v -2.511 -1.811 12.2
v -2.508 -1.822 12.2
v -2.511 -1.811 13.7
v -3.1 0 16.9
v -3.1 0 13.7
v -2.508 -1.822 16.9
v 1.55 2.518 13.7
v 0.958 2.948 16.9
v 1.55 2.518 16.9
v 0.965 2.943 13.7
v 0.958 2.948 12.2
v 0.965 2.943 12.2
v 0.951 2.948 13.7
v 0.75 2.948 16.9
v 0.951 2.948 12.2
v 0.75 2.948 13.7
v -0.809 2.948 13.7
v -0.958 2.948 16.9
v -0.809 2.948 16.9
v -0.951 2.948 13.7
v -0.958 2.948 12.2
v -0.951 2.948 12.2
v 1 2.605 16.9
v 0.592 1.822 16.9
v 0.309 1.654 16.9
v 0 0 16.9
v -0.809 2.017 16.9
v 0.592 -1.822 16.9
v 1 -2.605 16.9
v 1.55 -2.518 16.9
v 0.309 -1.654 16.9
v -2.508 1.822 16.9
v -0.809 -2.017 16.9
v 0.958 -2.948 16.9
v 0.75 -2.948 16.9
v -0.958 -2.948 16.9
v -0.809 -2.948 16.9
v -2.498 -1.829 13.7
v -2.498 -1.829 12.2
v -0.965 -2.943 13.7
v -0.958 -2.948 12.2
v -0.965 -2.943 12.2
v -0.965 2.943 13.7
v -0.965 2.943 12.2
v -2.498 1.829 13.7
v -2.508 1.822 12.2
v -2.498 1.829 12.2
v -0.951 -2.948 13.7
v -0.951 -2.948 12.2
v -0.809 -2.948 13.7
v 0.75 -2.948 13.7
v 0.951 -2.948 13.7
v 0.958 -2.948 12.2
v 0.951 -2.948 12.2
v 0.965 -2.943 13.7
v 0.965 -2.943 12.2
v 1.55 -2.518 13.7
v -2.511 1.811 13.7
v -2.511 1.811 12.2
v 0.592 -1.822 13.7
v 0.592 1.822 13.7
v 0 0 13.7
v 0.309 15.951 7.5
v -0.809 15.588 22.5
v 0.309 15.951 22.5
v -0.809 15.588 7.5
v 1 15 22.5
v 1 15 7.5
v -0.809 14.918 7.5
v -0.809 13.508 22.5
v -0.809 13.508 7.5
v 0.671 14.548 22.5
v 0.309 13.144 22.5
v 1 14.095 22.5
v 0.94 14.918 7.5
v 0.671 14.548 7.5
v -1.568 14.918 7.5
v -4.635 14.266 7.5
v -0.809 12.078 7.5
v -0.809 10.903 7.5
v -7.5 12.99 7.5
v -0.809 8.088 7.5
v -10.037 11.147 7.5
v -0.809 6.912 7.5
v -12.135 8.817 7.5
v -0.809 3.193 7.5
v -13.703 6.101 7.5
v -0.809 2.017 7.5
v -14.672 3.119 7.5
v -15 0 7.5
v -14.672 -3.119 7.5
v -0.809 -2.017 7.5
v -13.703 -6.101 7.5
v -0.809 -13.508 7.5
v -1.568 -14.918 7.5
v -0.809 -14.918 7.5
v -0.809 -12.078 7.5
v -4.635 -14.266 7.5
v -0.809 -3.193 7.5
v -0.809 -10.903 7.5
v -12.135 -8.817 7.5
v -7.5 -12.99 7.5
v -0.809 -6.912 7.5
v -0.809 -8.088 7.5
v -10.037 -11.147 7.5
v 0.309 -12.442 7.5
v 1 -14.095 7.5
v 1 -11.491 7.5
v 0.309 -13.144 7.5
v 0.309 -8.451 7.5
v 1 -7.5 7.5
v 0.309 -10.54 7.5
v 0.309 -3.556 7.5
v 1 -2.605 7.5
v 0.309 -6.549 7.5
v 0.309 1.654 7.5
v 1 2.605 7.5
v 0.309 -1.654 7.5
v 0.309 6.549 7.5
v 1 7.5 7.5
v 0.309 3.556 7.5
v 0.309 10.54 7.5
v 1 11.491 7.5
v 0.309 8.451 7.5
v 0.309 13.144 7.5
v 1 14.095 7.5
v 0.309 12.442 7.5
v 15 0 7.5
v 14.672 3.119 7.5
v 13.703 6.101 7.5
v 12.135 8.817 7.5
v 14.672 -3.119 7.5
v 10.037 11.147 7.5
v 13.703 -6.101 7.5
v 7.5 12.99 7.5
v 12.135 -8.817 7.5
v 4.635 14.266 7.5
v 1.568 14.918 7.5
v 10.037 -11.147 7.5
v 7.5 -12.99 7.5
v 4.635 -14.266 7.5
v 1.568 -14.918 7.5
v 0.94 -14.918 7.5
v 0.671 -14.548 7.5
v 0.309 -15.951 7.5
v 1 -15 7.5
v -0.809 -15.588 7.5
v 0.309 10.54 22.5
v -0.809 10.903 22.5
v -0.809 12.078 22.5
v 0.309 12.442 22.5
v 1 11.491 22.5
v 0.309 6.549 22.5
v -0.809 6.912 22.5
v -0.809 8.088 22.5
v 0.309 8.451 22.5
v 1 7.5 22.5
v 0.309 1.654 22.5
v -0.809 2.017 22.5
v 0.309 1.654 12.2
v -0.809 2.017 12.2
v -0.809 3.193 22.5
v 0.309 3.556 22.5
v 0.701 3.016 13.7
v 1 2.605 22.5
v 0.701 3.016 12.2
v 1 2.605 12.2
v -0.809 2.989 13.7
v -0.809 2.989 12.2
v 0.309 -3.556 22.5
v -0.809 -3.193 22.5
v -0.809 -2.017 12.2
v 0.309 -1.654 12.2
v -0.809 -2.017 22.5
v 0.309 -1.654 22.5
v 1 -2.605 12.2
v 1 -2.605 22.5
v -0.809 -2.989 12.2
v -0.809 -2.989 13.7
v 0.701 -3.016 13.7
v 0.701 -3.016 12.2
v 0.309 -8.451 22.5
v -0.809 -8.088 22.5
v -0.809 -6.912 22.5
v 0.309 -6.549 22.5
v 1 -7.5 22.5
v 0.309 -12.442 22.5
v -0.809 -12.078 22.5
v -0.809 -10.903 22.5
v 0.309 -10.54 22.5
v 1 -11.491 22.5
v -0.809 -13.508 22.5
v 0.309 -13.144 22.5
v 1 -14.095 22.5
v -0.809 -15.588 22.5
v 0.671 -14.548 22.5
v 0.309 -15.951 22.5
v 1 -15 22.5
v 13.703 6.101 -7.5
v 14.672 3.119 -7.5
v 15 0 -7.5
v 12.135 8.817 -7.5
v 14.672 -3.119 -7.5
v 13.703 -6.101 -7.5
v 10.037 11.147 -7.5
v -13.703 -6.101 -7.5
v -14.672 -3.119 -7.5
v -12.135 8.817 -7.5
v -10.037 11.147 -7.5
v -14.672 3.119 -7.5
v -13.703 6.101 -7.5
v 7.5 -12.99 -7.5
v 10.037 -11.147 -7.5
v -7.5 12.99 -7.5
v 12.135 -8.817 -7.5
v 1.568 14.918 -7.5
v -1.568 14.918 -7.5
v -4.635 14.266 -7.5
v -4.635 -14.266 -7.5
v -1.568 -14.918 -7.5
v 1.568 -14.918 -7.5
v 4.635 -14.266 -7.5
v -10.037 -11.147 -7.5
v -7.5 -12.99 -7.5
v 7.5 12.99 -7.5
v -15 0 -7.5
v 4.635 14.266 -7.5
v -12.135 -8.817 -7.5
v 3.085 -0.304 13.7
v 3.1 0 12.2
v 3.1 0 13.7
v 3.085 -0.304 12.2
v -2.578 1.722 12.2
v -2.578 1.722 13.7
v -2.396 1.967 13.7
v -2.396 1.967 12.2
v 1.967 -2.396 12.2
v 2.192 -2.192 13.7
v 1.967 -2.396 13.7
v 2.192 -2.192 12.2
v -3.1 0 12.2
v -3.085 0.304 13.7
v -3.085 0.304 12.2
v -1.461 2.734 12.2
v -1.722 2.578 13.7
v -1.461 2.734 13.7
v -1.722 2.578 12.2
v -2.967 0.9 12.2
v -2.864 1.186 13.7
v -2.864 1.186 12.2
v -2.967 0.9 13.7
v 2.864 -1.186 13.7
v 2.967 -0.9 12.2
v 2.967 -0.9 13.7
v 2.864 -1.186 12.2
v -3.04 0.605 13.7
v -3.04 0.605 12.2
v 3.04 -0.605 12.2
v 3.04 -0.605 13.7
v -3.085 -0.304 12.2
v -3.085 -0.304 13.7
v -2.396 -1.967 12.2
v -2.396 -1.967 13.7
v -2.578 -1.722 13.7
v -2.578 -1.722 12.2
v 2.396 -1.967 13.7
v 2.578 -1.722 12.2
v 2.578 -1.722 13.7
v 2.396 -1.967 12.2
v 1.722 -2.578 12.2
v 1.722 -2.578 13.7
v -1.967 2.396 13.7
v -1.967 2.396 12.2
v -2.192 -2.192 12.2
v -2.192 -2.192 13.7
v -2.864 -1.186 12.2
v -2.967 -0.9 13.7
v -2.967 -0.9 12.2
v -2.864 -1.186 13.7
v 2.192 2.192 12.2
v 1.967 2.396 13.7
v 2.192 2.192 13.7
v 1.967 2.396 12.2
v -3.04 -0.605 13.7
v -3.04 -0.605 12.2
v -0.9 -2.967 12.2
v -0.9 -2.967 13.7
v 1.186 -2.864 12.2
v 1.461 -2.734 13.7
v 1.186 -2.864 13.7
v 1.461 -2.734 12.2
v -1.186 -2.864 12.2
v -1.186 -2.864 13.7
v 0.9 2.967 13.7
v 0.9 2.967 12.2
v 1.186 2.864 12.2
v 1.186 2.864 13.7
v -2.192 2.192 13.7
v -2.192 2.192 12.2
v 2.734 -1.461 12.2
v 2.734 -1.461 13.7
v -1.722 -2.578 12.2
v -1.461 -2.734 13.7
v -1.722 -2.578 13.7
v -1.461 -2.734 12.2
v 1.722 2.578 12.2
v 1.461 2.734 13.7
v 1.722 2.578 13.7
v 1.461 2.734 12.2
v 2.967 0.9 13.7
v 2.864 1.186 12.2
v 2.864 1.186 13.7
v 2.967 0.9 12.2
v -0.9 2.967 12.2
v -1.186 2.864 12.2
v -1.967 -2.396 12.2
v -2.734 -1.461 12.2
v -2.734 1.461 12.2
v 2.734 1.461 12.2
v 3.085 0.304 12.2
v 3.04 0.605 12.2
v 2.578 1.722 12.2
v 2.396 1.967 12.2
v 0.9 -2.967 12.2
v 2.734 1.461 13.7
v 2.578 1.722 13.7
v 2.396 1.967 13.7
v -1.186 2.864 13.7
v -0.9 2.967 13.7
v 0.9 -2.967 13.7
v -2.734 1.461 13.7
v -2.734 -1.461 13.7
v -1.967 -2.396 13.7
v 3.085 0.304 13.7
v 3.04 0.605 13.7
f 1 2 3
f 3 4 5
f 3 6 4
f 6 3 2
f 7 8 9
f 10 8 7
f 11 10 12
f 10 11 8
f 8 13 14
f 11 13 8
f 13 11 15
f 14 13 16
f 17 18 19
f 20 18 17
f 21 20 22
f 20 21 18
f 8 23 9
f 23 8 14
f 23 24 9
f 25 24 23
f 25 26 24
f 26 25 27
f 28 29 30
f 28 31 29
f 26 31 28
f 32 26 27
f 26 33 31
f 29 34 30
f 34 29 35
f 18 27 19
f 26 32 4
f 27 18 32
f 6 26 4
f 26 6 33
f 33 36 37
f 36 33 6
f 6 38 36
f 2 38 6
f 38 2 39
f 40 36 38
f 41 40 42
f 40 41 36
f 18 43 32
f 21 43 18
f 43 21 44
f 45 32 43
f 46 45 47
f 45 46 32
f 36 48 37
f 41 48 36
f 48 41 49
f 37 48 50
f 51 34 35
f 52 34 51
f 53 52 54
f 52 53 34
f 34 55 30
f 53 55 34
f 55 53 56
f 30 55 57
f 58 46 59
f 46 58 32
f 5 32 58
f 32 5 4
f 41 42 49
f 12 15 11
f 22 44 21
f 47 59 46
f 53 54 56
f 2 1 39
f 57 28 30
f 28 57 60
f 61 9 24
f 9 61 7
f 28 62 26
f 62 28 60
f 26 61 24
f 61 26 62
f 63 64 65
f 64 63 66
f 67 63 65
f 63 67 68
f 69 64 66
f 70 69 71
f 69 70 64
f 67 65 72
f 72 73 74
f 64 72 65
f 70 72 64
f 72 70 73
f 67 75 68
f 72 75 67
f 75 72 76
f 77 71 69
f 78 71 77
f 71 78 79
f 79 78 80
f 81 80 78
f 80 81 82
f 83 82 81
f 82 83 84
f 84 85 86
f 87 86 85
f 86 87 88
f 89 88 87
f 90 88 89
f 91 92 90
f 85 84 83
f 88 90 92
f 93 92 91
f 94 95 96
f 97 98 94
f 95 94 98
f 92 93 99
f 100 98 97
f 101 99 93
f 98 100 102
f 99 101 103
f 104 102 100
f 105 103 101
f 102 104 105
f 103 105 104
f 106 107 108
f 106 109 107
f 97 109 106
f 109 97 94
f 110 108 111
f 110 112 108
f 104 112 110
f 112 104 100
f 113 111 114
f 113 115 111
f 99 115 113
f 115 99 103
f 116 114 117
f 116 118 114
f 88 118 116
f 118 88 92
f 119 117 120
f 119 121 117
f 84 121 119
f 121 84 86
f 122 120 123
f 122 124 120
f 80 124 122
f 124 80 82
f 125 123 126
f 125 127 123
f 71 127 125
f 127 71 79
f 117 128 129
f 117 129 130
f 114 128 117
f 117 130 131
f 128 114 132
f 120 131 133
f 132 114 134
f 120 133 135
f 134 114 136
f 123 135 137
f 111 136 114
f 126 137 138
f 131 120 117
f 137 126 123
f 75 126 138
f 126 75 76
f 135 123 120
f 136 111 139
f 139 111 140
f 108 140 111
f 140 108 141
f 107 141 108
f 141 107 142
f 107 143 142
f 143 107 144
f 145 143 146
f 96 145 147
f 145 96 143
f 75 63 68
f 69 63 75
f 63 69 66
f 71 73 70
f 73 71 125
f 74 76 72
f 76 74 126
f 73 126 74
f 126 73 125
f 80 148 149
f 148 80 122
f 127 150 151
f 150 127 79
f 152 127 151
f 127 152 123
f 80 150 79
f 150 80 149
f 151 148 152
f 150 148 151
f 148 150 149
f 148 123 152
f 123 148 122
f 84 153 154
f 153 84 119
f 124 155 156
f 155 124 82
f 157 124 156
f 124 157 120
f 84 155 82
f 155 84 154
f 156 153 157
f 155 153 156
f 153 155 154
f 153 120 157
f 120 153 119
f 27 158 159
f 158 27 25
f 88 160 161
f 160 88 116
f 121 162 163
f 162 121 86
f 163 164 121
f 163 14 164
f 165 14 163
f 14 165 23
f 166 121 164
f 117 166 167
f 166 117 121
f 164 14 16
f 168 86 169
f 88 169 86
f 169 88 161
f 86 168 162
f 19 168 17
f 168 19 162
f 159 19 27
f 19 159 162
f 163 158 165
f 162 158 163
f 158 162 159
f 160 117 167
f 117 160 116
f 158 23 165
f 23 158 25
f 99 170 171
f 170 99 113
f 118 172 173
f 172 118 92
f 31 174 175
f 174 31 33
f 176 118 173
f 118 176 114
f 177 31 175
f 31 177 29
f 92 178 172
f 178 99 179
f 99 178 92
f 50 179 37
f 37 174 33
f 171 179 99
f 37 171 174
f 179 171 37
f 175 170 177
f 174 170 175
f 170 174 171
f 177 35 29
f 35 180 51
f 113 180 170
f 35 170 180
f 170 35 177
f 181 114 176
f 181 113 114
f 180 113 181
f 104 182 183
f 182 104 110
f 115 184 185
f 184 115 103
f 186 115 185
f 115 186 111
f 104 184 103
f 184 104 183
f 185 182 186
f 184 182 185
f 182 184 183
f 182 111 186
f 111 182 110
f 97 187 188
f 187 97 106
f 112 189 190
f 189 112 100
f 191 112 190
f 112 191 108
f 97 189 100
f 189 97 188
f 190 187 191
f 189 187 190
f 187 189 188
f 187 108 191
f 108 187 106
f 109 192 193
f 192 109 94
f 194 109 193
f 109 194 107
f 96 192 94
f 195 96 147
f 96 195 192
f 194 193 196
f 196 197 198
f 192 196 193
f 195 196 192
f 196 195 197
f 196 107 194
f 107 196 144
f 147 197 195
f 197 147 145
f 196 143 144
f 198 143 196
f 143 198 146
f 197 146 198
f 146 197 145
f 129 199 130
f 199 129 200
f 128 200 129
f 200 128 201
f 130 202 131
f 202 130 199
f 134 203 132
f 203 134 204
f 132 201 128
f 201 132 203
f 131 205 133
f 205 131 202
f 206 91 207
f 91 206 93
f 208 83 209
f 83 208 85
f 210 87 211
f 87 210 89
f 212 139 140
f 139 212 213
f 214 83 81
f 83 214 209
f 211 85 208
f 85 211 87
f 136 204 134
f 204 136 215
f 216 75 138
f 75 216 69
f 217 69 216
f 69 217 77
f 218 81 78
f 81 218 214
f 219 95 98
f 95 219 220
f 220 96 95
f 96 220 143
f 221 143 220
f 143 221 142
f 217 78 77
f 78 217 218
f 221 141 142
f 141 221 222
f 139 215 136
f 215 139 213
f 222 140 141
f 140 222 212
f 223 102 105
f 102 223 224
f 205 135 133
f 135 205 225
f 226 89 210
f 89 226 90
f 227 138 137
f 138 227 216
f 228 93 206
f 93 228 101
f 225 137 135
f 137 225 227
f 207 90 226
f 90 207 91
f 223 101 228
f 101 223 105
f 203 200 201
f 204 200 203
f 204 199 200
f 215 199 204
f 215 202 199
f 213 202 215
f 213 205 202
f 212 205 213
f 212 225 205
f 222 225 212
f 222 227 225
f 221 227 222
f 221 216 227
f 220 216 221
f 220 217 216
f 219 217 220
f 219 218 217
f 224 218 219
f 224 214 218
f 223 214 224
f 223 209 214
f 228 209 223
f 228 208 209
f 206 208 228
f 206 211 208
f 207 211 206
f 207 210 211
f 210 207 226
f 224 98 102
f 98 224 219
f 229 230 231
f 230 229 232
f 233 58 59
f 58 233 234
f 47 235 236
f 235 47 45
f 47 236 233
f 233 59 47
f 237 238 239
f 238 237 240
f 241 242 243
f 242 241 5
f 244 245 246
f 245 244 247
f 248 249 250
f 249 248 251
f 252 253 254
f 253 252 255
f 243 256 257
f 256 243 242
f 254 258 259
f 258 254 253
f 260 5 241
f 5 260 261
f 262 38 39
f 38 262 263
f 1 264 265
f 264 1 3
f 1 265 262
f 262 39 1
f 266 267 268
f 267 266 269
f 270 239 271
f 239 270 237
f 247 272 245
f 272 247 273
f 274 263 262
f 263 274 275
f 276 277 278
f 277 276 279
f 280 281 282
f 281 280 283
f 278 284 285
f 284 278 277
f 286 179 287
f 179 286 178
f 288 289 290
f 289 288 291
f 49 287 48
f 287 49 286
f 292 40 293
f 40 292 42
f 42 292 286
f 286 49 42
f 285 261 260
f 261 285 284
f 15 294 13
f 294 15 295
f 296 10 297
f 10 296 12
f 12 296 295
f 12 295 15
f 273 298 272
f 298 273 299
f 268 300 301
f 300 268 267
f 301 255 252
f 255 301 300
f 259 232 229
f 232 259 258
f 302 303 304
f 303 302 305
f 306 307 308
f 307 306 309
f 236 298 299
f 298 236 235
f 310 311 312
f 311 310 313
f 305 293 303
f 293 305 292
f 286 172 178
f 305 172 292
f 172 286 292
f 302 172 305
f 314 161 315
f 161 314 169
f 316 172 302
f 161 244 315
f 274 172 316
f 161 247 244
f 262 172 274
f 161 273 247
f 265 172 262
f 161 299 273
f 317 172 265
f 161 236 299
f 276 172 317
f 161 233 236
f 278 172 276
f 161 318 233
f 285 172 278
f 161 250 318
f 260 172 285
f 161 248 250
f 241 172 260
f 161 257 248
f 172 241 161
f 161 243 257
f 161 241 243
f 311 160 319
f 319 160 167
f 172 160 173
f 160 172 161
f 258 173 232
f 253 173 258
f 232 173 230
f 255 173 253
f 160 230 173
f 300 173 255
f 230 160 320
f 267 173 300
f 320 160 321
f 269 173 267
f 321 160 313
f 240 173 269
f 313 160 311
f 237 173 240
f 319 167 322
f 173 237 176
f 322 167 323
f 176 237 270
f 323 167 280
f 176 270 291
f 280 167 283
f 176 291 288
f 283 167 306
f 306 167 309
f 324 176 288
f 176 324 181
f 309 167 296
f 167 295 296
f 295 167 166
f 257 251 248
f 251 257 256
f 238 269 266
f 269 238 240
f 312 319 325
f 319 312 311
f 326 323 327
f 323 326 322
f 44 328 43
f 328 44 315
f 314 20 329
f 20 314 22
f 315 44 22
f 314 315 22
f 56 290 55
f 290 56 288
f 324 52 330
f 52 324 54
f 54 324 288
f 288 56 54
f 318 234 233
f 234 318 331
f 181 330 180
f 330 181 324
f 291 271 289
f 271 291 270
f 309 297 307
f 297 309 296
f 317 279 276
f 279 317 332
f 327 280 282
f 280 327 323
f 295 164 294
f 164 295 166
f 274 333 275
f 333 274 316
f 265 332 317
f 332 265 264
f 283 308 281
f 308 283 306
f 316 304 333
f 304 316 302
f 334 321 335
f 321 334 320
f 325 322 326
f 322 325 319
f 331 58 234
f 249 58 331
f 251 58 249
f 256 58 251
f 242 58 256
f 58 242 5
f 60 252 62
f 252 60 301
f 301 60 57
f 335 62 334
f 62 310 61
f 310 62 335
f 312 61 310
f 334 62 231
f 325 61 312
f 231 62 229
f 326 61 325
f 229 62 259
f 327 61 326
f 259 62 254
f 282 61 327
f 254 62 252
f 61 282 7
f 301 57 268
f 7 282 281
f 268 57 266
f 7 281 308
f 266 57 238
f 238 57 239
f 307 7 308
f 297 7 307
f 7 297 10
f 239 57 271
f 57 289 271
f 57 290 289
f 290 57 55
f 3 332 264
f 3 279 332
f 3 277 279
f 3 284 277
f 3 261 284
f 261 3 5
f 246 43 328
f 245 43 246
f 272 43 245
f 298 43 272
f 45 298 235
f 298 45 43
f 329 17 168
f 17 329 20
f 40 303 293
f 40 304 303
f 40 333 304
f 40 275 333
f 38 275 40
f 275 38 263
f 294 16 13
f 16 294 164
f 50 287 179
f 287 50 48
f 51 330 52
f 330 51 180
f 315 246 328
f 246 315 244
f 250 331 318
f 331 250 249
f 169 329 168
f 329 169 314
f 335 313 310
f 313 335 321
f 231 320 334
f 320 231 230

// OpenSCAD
// Dimensions in mm
knob_diameter = 30;
knob_height = 15;
d_bore_diameter = 6.2;
d_bore_flat_distance = 4.7;
groove_diameter = 2;
groove_depth = 0;

// Z-axis offset to mirror the knob on the XY plane
z_offset = -knob_height / 2;

// Build the knob
translate([0, 0, z_offset])
    cylinder(h=knob_height, d=knob_diameter);

// Build the D-shaped blind bore
translate([0, 0, knob_height/2 + d_bore_flat_distance])
    difference() {
        cylinder(h=d_bore_flat_distance, d=d_bore_diameter);
        translate([d_bore_diameter/2, 0, -groove_depth/2])
            cylinder(h=d_bore_flat_distance, d=6.2);
    }

// Build the vertical grip grooves
for (i = [0:17]) {
    angle = i * 360 / 18;
    translate([0, cos(angle)*knob_diameter/2, knob_height/2])
        cylinder(h=knob_height, d=groove_diameter);
}

// Build the pointer groove
translate([0, 0, knob_height/2 + d_bore_flat_distance])
    linear_extrude(height=1.5) {
        circle(r=d_bore_diameter/2, $fn=64); // Set $fn to 64 for a smoother curve
    }
